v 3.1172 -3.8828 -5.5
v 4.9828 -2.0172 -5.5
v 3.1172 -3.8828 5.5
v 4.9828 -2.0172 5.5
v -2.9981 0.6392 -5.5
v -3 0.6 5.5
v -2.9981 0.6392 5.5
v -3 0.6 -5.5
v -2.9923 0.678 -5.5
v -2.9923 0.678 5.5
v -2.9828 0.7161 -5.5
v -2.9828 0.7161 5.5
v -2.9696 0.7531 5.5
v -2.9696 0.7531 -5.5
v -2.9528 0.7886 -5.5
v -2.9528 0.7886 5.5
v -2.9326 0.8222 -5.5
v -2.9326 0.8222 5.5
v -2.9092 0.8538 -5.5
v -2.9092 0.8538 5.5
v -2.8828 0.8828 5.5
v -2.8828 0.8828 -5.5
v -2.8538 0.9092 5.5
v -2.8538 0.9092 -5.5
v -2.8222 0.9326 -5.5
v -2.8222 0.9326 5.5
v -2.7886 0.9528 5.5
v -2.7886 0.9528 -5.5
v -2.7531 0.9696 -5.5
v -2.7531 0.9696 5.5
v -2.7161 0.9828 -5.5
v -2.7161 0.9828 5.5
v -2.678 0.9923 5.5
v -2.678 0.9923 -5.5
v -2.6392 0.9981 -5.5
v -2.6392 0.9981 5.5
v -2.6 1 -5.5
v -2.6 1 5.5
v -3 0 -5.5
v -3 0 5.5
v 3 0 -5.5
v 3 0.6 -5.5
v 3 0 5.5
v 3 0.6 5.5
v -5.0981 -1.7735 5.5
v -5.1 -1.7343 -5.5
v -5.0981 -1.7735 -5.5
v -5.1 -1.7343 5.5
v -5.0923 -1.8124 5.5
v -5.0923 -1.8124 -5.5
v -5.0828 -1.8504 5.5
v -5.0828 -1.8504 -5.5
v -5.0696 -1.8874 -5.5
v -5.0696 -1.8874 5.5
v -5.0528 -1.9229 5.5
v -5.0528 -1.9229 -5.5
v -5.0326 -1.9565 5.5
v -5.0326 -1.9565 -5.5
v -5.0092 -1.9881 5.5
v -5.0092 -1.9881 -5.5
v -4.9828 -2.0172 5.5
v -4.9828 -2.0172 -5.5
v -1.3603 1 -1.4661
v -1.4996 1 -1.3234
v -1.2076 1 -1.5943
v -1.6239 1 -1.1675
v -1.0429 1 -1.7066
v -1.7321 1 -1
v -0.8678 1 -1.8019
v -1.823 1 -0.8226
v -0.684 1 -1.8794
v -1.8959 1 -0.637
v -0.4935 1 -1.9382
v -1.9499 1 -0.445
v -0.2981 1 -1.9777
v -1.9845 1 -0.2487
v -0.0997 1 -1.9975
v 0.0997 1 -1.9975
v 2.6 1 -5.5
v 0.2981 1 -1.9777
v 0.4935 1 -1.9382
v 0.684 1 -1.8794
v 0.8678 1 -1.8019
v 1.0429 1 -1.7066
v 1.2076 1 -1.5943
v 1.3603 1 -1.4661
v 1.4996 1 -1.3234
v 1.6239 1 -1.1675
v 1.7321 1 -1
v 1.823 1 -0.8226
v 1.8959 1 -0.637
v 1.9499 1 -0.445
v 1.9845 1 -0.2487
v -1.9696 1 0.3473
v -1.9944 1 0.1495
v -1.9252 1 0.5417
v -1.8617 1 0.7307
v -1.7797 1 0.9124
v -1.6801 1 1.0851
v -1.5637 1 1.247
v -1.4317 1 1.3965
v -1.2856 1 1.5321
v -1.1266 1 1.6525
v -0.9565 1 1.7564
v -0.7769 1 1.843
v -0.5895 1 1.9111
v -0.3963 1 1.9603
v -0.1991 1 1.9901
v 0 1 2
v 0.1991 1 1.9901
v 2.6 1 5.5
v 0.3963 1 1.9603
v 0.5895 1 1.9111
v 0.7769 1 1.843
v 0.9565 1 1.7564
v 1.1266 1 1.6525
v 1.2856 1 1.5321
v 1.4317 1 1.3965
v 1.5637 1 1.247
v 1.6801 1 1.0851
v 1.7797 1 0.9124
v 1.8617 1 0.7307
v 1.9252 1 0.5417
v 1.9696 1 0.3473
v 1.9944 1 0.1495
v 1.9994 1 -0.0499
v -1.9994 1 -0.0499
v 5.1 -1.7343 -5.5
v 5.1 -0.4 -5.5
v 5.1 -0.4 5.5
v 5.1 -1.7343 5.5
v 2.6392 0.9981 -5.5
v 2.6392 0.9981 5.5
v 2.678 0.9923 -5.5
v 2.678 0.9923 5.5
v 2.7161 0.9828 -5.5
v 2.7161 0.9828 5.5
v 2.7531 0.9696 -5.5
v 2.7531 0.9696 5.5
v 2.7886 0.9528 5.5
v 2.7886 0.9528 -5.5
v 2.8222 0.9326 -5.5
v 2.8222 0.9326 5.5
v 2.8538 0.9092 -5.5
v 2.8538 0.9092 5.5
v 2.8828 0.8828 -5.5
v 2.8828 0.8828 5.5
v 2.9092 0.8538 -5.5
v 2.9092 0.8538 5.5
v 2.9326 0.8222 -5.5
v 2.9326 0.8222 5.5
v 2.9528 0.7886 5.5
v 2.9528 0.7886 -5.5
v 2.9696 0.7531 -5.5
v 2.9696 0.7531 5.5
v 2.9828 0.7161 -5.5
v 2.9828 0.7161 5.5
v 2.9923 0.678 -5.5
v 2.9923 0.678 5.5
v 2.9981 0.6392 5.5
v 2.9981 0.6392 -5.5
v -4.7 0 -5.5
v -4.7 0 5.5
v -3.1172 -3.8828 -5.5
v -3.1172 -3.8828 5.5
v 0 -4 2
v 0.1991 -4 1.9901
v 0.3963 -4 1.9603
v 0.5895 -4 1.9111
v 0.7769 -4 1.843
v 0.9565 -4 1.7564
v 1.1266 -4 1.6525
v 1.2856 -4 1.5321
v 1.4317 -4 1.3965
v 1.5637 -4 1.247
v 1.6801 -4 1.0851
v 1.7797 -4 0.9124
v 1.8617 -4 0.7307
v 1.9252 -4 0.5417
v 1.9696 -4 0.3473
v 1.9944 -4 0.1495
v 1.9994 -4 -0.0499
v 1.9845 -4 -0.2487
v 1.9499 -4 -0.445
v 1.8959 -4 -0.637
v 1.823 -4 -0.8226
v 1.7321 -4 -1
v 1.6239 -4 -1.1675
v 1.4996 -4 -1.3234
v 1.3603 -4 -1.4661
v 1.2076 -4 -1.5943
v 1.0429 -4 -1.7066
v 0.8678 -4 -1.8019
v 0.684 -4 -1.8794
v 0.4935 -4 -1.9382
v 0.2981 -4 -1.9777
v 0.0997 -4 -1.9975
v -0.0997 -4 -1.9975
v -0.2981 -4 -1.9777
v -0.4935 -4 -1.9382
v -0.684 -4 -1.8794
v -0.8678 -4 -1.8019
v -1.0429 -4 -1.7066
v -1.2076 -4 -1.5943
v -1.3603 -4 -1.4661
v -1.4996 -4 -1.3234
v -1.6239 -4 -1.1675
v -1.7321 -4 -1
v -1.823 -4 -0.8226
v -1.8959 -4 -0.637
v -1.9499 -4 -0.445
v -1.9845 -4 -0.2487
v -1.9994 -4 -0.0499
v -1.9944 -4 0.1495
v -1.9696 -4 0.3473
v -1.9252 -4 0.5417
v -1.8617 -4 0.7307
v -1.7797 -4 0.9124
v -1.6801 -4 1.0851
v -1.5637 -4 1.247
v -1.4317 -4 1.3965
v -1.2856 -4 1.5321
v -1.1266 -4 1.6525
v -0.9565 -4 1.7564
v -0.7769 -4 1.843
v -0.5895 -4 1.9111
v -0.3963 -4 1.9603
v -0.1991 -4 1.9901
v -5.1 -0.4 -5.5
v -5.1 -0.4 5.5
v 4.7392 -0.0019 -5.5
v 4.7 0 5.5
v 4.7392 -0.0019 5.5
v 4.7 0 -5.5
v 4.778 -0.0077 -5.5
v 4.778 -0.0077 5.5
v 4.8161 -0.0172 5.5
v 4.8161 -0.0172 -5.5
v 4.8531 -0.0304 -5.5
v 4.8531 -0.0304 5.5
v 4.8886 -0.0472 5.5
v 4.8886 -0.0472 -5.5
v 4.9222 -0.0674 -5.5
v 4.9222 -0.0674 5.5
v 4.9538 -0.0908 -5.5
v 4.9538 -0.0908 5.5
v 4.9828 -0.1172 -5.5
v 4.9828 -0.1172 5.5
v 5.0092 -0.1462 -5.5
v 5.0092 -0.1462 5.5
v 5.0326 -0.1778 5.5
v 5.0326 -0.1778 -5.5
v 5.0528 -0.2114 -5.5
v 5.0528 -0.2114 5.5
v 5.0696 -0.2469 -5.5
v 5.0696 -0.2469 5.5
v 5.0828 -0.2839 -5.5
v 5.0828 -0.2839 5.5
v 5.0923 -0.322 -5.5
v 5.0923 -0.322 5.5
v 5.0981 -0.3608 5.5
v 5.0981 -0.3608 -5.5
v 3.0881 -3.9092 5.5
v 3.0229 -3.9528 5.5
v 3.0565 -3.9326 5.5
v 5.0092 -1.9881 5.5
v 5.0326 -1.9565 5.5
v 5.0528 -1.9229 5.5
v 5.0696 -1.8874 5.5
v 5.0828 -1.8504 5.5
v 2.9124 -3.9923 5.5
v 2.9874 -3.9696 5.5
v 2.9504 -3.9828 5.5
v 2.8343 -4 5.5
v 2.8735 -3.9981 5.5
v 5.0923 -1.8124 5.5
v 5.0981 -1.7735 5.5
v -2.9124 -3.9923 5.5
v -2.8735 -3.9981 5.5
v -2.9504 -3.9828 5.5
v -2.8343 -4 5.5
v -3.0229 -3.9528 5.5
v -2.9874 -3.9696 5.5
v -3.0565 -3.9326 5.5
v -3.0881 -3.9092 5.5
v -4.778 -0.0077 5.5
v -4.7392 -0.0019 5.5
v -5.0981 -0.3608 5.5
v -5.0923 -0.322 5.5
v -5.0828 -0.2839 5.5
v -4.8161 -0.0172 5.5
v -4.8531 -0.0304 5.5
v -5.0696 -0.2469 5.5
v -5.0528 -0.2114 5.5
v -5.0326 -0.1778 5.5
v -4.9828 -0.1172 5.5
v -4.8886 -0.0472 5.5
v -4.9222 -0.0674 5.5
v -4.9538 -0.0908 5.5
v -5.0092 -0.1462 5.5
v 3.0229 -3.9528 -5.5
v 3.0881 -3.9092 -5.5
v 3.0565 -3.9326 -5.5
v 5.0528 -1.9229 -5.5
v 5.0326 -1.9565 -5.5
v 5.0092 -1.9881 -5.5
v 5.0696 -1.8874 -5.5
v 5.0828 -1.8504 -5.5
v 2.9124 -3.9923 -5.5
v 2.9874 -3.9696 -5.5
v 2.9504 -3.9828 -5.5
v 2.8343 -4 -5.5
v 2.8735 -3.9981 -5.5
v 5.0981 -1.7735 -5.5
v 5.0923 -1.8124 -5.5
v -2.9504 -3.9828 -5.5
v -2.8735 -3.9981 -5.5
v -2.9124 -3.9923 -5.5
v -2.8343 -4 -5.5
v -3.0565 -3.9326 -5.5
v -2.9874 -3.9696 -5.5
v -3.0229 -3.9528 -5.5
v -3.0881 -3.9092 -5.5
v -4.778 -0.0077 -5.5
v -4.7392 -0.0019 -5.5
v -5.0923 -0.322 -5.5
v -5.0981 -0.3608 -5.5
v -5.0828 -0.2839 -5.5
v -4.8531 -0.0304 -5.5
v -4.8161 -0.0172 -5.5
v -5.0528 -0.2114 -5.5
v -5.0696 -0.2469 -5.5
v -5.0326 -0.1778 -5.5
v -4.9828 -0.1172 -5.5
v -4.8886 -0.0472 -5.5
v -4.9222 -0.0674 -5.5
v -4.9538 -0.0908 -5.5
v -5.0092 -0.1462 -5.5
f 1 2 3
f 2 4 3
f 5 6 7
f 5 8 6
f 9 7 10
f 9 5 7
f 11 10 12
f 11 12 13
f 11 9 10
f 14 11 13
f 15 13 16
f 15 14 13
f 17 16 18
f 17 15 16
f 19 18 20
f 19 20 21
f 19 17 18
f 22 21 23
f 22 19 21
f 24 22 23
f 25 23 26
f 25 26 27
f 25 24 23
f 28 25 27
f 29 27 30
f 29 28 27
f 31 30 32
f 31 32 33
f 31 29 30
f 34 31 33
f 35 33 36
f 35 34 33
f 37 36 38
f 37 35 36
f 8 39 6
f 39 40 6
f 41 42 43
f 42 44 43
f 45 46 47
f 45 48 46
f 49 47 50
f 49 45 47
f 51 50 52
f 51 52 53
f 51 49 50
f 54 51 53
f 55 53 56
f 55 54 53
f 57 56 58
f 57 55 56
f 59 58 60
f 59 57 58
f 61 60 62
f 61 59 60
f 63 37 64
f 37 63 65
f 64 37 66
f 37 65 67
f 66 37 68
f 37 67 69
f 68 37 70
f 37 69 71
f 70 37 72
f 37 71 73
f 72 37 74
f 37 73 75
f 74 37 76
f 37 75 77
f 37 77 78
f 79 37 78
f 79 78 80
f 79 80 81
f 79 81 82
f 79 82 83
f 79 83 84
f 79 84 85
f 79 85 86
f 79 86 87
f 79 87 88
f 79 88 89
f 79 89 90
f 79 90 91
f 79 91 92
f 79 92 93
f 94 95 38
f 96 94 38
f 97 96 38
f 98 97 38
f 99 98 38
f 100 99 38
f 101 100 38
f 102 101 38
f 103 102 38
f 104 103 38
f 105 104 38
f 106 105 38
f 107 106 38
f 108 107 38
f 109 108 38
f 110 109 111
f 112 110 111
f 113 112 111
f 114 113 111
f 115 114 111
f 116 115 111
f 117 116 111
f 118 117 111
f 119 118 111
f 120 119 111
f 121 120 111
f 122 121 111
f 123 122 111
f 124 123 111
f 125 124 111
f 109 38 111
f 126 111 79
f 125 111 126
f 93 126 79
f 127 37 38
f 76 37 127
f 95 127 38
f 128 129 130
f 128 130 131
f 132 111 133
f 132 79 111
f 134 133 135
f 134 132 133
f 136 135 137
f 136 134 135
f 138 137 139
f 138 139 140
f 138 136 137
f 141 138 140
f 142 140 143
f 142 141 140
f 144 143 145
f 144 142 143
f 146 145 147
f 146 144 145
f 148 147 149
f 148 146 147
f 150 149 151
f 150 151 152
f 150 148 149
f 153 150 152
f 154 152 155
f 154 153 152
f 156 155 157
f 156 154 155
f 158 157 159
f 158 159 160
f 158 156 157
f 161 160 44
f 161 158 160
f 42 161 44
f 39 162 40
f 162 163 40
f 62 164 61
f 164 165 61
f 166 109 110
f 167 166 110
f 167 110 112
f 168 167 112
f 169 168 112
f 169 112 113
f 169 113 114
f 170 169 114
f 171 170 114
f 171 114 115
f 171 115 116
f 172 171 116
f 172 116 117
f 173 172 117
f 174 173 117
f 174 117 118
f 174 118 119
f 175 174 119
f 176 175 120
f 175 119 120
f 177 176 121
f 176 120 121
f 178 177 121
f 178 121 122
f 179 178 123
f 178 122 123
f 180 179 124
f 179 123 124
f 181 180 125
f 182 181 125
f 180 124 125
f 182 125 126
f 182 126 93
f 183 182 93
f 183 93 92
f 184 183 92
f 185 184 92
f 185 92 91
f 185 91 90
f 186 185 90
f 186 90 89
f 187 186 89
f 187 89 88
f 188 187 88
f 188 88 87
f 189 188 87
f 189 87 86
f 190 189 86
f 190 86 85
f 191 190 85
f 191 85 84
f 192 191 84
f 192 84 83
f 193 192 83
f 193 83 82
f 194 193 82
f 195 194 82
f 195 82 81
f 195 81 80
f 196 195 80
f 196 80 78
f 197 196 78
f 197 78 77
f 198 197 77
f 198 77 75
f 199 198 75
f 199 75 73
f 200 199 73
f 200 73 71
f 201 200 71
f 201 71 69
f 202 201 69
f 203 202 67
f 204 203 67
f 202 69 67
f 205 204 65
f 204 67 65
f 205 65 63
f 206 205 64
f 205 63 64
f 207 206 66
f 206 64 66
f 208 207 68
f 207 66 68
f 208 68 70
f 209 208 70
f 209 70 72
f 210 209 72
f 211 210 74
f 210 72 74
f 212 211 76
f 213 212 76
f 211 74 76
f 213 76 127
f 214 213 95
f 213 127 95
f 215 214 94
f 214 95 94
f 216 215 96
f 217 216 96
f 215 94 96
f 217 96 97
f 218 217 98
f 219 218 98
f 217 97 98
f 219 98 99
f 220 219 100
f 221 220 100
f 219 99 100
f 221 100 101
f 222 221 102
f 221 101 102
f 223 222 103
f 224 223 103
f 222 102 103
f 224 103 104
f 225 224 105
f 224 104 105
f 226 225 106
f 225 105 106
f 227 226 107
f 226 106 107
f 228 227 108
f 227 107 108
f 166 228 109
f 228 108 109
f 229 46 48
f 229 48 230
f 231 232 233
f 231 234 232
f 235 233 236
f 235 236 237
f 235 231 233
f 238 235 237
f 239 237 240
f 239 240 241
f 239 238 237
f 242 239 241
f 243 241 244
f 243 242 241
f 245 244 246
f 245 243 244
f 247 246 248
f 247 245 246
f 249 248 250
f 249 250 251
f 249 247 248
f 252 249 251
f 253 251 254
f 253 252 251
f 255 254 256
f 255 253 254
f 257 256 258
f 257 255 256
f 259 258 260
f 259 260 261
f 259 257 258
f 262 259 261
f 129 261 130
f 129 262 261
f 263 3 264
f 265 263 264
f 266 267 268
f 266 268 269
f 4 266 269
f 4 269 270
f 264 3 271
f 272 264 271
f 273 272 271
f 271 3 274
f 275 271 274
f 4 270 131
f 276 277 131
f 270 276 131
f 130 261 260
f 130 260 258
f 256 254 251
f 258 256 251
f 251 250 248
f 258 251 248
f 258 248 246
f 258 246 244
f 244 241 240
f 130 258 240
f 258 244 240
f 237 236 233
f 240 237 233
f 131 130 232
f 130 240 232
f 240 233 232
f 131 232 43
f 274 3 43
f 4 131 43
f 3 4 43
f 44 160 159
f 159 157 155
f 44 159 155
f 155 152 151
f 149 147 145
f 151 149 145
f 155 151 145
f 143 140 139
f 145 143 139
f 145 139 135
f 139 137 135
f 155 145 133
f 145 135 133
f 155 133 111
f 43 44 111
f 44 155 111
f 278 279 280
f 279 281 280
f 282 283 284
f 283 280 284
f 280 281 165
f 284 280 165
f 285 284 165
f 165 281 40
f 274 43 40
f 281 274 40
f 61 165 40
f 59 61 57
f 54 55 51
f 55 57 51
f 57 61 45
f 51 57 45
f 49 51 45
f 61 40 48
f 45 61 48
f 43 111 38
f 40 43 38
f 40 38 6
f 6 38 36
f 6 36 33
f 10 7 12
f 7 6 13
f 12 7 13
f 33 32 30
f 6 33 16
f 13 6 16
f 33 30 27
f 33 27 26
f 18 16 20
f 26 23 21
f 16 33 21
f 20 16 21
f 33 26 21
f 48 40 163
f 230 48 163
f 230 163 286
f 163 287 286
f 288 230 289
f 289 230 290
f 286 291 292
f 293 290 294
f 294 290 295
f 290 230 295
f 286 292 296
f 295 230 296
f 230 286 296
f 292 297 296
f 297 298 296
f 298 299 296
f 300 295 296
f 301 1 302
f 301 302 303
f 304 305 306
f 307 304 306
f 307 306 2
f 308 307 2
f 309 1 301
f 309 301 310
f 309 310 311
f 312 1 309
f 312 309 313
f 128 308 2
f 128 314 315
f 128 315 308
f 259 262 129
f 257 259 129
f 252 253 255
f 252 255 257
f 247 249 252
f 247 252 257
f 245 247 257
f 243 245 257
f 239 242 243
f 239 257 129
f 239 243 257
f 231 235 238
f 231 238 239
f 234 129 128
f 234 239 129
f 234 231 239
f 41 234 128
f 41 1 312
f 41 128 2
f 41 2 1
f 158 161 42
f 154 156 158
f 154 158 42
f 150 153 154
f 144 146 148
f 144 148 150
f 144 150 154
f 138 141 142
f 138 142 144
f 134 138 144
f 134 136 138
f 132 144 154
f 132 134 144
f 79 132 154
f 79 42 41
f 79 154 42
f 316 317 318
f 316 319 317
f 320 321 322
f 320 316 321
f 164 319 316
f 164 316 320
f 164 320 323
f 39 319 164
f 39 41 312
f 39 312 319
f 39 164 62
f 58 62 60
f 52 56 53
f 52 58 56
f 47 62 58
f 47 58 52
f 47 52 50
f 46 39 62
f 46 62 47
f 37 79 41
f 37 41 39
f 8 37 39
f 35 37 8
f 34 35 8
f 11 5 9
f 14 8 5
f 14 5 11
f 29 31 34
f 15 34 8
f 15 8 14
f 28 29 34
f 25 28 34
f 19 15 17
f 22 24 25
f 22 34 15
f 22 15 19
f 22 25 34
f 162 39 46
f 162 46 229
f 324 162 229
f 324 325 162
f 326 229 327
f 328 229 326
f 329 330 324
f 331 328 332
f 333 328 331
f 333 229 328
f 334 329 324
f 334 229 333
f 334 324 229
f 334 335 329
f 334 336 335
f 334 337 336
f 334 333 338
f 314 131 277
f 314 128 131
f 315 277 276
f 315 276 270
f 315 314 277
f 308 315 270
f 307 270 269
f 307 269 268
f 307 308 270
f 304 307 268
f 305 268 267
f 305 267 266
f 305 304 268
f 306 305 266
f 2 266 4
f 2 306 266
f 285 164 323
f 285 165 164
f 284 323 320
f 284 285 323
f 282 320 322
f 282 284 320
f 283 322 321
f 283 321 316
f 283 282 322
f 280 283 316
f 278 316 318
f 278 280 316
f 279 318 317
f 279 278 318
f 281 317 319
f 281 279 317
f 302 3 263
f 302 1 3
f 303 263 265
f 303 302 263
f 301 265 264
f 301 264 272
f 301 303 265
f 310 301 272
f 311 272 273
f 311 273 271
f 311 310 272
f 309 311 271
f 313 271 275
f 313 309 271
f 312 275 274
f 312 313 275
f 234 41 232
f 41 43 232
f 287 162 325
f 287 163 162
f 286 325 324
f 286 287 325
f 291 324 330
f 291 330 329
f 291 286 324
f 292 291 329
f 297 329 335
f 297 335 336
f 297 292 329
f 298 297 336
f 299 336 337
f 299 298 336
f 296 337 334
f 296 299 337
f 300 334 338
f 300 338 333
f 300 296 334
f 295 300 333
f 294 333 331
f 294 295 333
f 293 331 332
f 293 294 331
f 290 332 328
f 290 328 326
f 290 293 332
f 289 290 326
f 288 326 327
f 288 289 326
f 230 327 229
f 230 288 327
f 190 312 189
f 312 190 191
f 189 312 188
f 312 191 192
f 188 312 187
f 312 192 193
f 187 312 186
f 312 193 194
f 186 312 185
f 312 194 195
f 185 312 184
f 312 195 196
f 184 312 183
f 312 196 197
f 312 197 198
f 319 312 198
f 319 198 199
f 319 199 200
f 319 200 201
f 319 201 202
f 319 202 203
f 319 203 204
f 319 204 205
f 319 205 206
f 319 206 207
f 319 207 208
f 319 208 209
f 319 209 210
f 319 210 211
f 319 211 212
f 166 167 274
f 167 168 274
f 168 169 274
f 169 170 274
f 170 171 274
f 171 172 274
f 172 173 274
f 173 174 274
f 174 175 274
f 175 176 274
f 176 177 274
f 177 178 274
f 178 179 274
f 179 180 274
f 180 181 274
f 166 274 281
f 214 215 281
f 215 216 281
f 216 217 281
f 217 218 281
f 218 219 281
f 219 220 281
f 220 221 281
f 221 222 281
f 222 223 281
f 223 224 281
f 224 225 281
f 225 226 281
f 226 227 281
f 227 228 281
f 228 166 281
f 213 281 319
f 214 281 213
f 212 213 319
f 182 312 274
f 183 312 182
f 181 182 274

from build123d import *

# Parameters (mm, degrees)
EXTRUDE_1_DEPTH     = 5.5
SKETCH_2_R          = 2
CUT_EXTRUDE_1_DEPTH = 10.014432872
FILLET_1_R          = 0.4


with BuildPart() as part:
    # 草图1 → 凸台-拉伸1 (new, symmetric)
    with BuildSketch(Plane.XY):
        Polygon((-5.1, 0), (-3, 0), (-3, 1), (3, 1), (3, 0), (5.1, 0), (5.1, -1.9), (3, -4), (-3, -4), (-5.1, -1.9), align=None)
    extrude(amount=EXTRUDE_1_DEPTH, both=True)

    # 草图2 → 切除-拉伸1 (cut, through all)
    with BuildSketch(Plane(origin=(0, 1, 0), x_dir=(1, 0, 0), z_dir=(0, 1, 0))):
        with Locations(Location((0, 0, 0), (0, 0, 270))):
            Circle(SKETCH_2_R)
    extrude(amount=-CUT_EXTRUDE_1_DEPTH, mode=Mode.SUBTRACT)

    # 圆角1
    fillet_1_edges = [part.edges().sort_by_distance(p)[0] for p in [
        (-5.1, 0, 0),
        (-3, 1, 0),
        (3, 1, 0),
        (5.1, 0, 0),
        (5.1, -1.9, 0),
        (3, -4, 0),
        (-3, -4, 0),
        (-5.1, -1.9, 0),
    ]]
    fillet(fillet_1_edges, radius=FILLET_1_R)


solid = part.part
